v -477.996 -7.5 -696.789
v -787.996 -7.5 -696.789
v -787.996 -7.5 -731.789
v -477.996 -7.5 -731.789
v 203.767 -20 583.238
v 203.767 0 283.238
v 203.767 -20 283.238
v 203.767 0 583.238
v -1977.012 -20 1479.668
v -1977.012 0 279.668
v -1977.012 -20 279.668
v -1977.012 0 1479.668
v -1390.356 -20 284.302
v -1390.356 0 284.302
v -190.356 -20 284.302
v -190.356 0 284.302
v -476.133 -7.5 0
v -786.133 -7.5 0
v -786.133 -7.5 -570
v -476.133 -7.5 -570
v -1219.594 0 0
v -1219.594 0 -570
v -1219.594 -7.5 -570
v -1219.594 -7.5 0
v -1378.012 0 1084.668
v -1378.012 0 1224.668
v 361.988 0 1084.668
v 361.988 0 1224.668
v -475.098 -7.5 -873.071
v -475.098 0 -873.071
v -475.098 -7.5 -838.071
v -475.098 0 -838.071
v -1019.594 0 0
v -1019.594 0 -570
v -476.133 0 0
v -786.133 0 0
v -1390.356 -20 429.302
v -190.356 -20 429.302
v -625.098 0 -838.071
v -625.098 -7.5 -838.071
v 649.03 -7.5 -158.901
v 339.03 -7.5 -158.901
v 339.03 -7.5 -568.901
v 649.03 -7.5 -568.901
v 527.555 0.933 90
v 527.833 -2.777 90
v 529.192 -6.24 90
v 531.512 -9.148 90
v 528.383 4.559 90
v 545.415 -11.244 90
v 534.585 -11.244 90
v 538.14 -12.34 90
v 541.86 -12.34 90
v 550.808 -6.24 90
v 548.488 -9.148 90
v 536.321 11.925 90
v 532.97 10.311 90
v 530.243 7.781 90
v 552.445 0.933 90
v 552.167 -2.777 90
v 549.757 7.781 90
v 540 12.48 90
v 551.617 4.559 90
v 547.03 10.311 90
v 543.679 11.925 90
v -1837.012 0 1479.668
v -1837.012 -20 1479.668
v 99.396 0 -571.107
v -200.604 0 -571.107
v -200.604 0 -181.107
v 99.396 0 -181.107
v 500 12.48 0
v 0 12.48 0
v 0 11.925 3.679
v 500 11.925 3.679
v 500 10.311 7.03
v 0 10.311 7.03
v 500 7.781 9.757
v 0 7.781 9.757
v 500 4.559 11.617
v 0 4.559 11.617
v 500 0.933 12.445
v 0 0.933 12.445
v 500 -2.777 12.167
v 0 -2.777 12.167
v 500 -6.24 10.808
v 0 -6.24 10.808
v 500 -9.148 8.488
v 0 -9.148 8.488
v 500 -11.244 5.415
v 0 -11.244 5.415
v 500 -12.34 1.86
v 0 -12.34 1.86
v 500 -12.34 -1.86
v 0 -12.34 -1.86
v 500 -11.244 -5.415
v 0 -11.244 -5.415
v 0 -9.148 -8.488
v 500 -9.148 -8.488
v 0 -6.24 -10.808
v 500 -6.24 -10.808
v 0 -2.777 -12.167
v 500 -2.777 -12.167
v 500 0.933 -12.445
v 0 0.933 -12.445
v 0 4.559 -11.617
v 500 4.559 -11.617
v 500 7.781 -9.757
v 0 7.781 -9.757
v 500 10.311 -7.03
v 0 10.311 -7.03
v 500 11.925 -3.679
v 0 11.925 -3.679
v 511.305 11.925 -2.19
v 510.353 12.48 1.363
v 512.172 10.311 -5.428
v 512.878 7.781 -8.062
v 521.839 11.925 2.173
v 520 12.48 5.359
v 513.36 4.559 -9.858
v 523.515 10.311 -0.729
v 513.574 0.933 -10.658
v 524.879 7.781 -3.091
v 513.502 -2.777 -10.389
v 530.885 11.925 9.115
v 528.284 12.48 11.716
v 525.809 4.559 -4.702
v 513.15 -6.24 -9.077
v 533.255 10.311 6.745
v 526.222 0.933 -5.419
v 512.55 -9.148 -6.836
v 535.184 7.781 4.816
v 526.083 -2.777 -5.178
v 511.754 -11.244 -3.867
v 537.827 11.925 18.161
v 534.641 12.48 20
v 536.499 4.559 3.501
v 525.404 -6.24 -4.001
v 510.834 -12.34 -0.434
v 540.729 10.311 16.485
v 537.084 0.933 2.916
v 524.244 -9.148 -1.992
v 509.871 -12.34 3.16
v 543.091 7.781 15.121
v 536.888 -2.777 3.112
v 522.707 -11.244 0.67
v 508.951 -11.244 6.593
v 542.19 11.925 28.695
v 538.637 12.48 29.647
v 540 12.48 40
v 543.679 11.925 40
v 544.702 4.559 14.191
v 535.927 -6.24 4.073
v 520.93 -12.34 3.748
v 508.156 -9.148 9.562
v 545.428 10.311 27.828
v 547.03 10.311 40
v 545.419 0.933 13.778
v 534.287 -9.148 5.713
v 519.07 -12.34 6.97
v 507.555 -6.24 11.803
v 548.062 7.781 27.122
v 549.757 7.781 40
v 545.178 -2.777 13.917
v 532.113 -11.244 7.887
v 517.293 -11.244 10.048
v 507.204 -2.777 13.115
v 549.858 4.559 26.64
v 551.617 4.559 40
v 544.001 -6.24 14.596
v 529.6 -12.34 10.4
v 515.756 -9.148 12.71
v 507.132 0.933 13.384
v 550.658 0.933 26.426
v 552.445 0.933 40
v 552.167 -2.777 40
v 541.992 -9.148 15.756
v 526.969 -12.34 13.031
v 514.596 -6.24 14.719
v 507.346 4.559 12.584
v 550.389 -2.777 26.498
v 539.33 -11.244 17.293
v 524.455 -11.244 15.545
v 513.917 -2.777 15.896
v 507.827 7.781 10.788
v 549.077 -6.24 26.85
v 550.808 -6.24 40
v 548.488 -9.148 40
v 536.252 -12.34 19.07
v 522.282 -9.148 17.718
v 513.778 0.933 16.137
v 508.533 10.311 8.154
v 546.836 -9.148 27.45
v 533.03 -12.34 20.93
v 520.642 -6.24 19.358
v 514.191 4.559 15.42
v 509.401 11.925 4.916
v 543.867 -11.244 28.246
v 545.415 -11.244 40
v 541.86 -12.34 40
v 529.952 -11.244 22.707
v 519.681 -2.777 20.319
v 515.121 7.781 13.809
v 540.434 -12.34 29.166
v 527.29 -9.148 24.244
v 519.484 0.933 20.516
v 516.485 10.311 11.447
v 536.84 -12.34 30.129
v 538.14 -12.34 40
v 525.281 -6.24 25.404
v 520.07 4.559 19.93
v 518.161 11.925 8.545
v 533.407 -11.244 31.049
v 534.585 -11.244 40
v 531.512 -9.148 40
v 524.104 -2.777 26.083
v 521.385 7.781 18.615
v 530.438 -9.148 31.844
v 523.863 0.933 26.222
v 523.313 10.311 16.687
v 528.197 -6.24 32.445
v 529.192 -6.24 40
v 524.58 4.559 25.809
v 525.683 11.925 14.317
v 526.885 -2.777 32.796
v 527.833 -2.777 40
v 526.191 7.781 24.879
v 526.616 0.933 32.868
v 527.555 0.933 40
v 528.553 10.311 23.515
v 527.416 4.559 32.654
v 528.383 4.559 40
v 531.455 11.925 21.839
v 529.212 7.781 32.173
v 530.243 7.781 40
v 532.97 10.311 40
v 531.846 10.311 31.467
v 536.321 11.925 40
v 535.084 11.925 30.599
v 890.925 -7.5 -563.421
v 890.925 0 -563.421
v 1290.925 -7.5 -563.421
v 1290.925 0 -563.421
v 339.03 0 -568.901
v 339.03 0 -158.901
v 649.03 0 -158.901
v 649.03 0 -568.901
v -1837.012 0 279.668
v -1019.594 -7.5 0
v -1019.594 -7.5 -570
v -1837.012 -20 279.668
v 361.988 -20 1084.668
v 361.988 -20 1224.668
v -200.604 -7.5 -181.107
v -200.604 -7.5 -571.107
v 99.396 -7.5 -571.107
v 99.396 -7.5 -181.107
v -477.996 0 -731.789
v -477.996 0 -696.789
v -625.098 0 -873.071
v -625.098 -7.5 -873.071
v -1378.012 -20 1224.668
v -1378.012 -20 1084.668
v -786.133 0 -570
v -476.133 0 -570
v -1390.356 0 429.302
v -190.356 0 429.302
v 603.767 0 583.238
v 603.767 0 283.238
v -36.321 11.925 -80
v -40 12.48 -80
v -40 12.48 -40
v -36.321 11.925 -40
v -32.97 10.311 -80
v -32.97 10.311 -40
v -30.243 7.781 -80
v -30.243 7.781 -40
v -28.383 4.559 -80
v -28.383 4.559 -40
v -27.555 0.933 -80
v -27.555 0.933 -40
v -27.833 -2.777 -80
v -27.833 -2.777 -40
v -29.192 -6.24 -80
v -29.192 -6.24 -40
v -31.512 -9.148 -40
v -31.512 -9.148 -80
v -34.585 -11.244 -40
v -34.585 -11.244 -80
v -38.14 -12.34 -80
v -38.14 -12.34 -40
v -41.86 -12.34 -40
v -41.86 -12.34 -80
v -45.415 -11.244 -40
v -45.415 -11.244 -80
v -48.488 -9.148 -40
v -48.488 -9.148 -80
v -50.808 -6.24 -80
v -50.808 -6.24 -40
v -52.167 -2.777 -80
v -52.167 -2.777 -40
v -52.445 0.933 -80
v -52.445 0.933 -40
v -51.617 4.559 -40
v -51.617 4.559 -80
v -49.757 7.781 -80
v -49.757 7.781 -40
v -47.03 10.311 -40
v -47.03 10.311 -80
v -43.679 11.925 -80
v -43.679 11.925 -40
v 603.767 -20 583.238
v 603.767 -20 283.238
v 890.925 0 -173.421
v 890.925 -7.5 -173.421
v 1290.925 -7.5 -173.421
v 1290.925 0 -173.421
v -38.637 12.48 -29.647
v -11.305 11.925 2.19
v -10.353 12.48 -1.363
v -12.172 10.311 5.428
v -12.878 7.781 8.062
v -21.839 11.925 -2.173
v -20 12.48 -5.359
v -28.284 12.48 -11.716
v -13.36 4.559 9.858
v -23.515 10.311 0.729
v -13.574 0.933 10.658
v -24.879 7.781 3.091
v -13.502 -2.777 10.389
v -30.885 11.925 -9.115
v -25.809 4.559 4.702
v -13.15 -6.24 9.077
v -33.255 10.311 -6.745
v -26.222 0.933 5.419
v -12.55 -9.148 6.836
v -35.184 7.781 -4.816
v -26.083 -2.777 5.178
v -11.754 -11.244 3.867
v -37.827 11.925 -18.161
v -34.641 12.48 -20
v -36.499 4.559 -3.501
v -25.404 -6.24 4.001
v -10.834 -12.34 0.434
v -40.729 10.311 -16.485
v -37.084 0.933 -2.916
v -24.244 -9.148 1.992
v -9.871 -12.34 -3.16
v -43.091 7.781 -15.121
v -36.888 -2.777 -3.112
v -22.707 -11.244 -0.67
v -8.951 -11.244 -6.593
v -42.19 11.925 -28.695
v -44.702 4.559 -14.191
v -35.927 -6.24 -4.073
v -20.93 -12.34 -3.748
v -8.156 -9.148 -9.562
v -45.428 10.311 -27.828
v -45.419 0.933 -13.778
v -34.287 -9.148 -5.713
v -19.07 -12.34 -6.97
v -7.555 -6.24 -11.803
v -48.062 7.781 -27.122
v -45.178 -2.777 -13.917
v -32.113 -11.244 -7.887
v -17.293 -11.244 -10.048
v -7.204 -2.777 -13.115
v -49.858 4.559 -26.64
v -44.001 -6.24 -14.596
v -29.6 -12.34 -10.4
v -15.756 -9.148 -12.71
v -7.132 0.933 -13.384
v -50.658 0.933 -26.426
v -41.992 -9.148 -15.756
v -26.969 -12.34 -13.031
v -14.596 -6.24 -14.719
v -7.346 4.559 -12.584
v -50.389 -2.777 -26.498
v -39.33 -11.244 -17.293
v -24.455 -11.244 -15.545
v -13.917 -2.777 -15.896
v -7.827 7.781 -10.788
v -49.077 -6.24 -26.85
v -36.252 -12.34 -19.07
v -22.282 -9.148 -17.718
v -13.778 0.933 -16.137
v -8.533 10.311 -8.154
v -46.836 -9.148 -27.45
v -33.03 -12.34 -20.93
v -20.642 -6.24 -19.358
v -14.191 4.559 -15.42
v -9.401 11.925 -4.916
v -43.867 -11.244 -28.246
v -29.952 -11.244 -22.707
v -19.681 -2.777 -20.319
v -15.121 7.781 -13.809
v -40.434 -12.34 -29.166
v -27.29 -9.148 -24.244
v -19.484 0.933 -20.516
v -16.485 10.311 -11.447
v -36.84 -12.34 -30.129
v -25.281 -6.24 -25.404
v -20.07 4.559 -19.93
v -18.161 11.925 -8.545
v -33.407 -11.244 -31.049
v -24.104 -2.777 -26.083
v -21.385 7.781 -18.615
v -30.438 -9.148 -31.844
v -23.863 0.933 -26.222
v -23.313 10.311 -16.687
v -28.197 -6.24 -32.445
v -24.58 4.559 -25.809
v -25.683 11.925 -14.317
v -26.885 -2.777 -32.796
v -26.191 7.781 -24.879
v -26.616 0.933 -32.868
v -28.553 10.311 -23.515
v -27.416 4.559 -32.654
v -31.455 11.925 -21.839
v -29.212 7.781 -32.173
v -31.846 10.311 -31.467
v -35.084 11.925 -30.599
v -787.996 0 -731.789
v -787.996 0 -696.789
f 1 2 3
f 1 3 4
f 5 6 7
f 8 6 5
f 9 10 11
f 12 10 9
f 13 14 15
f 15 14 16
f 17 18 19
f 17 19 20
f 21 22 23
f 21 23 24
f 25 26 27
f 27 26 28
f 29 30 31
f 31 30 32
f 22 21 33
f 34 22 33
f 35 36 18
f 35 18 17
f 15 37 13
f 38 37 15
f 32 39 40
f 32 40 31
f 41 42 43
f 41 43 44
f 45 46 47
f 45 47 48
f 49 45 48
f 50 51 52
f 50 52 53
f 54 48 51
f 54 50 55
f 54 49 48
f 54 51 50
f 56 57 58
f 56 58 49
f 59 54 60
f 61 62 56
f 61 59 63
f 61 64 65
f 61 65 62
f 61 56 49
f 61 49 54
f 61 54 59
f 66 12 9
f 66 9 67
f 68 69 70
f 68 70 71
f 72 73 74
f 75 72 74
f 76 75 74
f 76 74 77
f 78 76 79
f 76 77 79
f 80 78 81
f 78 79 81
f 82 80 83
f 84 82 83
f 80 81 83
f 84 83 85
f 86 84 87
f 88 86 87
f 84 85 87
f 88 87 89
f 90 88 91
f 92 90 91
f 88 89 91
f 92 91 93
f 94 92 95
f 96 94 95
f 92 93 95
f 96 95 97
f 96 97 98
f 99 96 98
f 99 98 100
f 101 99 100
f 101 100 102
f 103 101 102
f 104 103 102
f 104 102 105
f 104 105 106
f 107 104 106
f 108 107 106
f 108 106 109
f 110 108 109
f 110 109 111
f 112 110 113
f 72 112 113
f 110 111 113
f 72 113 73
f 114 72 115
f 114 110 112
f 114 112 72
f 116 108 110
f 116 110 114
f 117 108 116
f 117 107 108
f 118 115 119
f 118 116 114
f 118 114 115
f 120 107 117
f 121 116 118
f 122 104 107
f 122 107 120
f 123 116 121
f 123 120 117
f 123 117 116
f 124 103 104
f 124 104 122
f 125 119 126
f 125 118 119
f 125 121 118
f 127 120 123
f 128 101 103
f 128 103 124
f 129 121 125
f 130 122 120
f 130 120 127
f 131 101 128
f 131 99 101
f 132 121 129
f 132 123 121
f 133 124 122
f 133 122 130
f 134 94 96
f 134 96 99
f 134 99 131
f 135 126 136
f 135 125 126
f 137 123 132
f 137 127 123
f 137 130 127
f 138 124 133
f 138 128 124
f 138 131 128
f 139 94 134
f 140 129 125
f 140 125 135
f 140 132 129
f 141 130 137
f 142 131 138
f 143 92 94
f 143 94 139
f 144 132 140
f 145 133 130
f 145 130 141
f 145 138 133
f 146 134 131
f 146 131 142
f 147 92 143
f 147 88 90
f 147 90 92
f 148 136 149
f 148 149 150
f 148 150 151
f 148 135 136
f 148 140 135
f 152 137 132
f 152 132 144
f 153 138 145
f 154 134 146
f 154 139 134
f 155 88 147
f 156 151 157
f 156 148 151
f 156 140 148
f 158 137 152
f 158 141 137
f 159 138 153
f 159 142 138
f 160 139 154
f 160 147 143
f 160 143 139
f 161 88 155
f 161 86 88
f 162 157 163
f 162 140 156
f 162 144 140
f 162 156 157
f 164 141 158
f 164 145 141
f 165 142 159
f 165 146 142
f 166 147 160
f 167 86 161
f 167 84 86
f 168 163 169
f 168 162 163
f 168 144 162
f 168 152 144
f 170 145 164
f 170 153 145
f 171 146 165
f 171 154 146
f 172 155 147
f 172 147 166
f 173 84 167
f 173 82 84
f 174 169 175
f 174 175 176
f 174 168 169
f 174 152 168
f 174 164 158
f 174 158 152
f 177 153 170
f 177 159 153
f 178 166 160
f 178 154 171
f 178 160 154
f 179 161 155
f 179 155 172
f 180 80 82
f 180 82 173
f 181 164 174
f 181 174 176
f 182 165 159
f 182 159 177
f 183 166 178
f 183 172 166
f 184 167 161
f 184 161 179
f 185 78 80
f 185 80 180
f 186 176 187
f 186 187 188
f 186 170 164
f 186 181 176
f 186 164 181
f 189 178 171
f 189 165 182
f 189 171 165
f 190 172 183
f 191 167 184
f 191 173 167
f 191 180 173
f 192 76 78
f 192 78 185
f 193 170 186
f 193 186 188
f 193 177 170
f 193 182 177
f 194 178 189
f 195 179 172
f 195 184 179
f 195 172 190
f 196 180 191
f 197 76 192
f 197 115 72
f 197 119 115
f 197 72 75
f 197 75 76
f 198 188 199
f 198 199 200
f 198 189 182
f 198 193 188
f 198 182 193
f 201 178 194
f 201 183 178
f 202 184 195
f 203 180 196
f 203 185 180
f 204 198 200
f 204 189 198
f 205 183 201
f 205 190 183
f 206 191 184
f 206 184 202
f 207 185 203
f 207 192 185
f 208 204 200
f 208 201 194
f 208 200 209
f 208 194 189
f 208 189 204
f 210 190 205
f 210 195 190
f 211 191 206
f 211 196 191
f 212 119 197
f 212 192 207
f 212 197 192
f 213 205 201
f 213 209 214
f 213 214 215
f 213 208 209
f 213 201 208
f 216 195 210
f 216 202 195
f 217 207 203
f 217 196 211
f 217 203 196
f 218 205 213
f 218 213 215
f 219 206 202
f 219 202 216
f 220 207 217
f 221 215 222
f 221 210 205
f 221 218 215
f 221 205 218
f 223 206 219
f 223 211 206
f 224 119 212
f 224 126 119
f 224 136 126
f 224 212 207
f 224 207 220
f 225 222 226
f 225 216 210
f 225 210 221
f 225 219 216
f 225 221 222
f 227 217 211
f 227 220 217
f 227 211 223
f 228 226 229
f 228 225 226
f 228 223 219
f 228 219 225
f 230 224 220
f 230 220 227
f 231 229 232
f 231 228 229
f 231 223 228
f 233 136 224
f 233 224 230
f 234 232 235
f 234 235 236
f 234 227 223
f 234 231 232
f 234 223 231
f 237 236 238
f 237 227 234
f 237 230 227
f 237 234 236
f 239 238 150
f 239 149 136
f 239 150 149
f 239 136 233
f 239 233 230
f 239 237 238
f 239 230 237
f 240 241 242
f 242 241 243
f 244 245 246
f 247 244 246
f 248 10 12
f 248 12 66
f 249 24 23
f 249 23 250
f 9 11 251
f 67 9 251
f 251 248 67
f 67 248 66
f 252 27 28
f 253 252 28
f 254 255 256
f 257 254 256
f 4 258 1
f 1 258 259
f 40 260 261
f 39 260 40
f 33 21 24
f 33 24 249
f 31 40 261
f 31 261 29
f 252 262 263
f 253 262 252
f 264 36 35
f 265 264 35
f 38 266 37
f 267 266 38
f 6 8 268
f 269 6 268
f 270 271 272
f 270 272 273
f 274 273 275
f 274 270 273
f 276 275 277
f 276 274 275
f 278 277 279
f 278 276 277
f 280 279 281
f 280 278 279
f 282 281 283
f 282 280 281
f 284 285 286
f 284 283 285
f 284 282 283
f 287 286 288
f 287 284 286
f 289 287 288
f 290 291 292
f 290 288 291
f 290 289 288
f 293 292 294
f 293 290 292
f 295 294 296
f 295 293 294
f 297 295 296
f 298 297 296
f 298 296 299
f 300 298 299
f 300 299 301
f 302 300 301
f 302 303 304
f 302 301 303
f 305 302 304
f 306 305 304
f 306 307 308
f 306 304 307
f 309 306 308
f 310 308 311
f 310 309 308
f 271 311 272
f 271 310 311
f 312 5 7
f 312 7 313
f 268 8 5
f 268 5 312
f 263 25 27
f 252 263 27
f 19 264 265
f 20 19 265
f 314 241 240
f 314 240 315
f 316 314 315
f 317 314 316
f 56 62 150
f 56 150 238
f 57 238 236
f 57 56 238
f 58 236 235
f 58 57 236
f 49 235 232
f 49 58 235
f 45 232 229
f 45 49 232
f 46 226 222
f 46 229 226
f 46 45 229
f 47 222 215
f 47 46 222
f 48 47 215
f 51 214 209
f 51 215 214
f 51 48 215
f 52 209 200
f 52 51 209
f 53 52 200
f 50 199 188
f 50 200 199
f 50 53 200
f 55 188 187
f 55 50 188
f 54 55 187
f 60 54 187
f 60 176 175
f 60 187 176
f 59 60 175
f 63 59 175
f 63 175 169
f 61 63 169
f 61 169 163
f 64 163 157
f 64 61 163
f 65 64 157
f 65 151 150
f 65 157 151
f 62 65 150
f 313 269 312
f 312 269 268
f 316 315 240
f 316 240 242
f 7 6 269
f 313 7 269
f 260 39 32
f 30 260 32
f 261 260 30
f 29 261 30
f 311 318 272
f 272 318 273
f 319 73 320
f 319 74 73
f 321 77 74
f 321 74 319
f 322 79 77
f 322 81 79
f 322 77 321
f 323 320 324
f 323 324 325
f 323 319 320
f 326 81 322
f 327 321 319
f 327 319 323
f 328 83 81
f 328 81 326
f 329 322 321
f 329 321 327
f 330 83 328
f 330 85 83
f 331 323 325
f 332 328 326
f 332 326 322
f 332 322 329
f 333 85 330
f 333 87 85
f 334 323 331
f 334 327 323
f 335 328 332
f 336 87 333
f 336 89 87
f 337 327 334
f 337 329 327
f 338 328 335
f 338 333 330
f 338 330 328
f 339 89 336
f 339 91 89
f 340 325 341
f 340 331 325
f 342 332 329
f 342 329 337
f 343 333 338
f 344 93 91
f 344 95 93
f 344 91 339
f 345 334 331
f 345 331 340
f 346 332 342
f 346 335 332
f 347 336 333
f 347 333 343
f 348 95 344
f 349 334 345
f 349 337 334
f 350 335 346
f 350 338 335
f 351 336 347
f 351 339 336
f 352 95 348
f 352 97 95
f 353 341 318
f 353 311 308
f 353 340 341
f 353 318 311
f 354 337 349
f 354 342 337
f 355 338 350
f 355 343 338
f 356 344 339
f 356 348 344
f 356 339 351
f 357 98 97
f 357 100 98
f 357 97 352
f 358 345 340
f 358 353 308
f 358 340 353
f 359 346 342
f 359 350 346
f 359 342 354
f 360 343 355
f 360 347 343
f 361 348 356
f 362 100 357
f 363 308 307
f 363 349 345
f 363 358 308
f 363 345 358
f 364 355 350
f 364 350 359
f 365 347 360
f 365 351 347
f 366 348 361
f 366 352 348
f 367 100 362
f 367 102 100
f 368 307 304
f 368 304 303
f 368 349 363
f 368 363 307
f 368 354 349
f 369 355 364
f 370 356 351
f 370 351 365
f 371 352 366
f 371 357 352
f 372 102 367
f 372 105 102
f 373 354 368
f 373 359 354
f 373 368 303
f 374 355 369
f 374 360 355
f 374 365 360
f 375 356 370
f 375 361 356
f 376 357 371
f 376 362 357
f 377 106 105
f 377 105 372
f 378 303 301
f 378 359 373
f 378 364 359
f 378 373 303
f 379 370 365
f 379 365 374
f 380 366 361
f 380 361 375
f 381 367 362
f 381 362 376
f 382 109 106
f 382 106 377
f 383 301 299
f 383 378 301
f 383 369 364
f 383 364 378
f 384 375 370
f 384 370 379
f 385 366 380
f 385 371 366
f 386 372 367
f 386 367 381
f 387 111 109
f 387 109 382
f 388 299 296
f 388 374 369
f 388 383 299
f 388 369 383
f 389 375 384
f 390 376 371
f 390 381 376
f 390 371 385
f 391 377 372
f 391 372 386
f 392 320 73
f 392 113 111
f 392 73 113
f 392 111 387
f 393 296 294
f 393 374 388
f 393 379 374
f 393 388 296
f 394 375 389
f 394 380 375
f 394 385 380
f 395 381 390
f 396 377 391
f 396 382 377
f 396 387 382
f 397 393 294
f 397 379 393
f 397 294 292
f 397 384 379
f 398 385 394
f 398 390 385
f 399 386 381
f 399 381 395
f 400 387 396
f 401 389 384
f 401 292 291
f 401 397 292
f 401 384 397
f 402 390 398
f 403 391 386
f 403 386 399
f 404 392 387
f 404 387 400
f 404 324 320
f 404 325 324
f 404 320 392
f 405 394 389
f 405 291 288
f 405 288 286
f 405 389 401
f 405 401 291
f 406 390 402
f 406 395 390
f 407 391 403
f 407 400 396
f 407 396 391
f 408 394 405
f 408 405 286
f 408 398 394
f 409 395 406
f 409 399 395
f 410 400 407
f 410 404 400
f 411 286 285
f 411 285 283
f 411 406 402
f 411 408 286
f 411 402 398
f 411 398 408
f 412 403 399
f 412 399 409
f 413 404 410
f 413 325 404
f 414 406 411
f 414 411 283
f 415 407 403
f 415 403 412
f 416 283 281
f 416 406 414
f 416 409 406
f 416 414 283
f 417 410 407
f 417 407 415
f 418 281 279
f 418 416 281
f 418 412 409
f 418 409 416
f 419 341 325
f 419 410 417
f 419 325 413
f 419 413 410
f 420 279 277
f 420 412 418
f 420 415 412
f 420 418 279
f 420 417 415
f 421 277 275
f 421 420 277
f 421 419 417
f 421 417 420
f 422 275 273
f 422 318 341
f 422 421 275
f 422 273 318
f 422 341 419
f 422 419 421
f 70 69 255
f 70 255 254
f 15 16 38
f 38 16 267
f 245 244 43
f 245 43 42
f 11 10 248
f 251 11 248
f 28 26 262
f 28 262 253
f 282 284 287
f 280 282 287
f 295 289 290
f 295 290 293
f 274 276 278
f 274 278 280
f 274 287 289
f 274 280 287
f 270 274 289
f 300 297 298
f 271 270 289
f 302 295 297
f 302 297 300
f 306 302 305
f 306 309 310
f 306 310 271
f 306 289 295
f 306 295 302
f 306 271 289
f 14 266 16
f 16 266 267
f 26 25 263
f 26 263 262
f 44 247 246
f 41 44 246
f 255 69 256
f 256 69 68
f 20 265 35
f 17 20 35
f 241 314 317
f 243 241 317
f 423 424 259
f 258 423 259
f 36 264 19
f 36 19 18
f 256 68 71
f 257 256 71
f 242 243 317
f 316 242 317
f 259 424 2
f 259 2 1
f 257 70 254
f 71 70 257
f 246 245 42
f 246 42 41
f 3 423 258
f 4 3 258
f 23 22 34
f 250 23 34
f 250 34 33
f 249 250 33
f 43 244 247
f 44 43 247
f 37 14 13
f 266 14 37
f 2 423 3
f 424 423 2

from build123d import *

# Parameters (mm, degrees)
F0_R       = 12.4798531306
F1_DEPTH   = 500
F2_W       = 400
F2_H       = 300
F3_DEPTH   = 20
F4_W       = 1200
F4_H       = 145
F5_DEPTH   = 20
F6_W       = 1740
F6_H       = 140
F7_DEPTH   = 20
F6_W_2     = 140
F6_H_2     = 1200
F8_DEPTH   = 20
F9_W       = 310
F9_H       = 570
F10_DEPTH  = 7.5
F11_W      = 200
F11_H      = 570
F12_DEPTH  = 7.5
F13_W      = 310
F13_H      = 35
F14_DEPTH  = 7.5
F15_W      = 300
F15_H      = 390
F16_DEPTH  = 7.5
F17_W      = 310
F17_H      = 410
F18_DEPTH  = 7.5
F19_W      = 400
F19_H      = 390
F20_DEPTH  = 7.5
F1_FACE_R  = 12.4798531306
F1_FACE1_R = 12.4798531306
F24_W      = 150
F24_H      = 35
F25_DEPTH  = 7.5


with BuildPart() as f1:
    # F0 (on Right) → F1 (new body)
    with BuildSketch(Plane.YZ):
        Circle(F0_R)
    extrude(amount=F1_DEPTH)

    # F22: sweep along a path in F21
    with BuildLine(Plane.XZ) as f22_path:
        ThreePointArc((0, 0), (-28.2842712475, -11.7157287525), (-40, -40))
        Line((-40, -40), (-40, -80))
    # F1_face (on face) → F22 (sweep)
    with BuildSketch(Plane(origin=(0, 0, 0), x_dir=(0, 1, 0), z_dir=(-1, 0, 0))):
        Circle(F1_FACE_R)
    sweep(path=f22_path.line)

    # F23: sweep along a path in F21
    with BuildLine(Plane.XZ) as f23_path:
        ThreePointArc((500, 0), (528.2842712475, 11.7157287525), (540, 40))
        Line((540, 40), (540, 90))
    # F1_face1 (on face) → F23 (sweep)
    with BuildSketch(Plane.YZ.offset(500)):
        Circle(F1_FACE1_R)
    sweep(path=f23_path.line)


with BuildPart() as f3:
    # F2 (on Front) → F3 (new body)
    with BuildSketch(Plane.XZ):
        with Locations((403.7673175335, 433.2379341125)):
            Rectangle(F2_W, F2_H)
    extrude(amount=F3_DEPTH)


with BuildPart() as f5:
    # F4 (on Front) → F5 (new body)
    with BuildSketch(Plane.XZ):
        with Locations((-790.3555542231, 356.8016982079)):
            Rectangle(F4_W, F4_H)
    extrude(amount=F5_DEPTH)


with BuildPart() as f7:
    # F6 (on Front) → F7 (new body)
    with BuildSketch(Plane.XZ):
        with Locations((-508.0117034912, 1154.6680629253)):
            Rectangle(F6_W, F6_H)
    extrude(amount=F7_DEPTH)


with BuildPart() as f8:
    # F6 (on Front) → F8 (new body)
    with BuildSketch(Plane.XZ):
        with Locations((-1907.0119190216, 879.6680629253)):
            Rectangle(F6_W_2, F6_H_2)
    extrude(amount=F8_DEPTH)


with BuildPart() as f10:
    # F9 (on Front) → F10 (new body)
    with BuildSketch(Plane.XZ):
        with Locations((-631.1330509186, -285)):
            Rectangle(F9_W, F9_H)
    extrude(amount=F10_DEPTH)


with BuildPart() as f12:
    # F11 (on Front) → F12 (new body)
    with BuildSketch(Plane.XZ):
        with Locations((-1119.5944786072, -285)):
            Rectangle(F11_W, F11_H)
    extrude(amount=F12_DEPTH)


with BuildPart() as f14:
    # F13 (on Front) → F14 (new body)
    with BuildSketch(Plane.XZ):
        with Locations((-632.9960215092, -714.2890524864)):
            Rectangle(F13_W, F13_H)
    extrude(amount=F14_DEPTH)


with BuildPart() as f16:
    # F15 (on Front) → F16 (new body)
    with BuildSketch(Plane.XZ):
        with Locations((-50.6044387817, -376.1068511009)):
            Rectangle(F15_W, F15_H)
    extrude(amount=F16_DEPTH)


with BuildPart() as f18:
    # F17 (on Front) → F18 (new body)
    with BuildSketch(Plane.XZ):
        with Locations((494.0304470062, -363.9005255699)):
            Rectangle(F17_W, F17_H)
    extrude(amount=F18_DEPTH)


with BuildPart() as f20:
    # F19 (on Front) → F20 (new body)
    with BuildSketch(Plane.XZ):
        with Locations((1090.9248709679, -368.4208321571)):
            Rectangle(F19_W, F19_H)
    extrude(amount=F20_DEPTH)


with BuildPart() as f25:
    # F24 (on Front) → F25 (new body)
    with BuildSketch(Plane.XZ):
        with Locations((-550.097566843, -855.5714654922)):
            Rectangle(F24_W, F24_H)
    extrude(amount=F25_DEPTH)


solid = Compound([f1.part, f3.part, f5.part, f7.part, f8.part, f10.part, f12.part, f14.part, f16.part, f18.part, f20.part, f25.part])
